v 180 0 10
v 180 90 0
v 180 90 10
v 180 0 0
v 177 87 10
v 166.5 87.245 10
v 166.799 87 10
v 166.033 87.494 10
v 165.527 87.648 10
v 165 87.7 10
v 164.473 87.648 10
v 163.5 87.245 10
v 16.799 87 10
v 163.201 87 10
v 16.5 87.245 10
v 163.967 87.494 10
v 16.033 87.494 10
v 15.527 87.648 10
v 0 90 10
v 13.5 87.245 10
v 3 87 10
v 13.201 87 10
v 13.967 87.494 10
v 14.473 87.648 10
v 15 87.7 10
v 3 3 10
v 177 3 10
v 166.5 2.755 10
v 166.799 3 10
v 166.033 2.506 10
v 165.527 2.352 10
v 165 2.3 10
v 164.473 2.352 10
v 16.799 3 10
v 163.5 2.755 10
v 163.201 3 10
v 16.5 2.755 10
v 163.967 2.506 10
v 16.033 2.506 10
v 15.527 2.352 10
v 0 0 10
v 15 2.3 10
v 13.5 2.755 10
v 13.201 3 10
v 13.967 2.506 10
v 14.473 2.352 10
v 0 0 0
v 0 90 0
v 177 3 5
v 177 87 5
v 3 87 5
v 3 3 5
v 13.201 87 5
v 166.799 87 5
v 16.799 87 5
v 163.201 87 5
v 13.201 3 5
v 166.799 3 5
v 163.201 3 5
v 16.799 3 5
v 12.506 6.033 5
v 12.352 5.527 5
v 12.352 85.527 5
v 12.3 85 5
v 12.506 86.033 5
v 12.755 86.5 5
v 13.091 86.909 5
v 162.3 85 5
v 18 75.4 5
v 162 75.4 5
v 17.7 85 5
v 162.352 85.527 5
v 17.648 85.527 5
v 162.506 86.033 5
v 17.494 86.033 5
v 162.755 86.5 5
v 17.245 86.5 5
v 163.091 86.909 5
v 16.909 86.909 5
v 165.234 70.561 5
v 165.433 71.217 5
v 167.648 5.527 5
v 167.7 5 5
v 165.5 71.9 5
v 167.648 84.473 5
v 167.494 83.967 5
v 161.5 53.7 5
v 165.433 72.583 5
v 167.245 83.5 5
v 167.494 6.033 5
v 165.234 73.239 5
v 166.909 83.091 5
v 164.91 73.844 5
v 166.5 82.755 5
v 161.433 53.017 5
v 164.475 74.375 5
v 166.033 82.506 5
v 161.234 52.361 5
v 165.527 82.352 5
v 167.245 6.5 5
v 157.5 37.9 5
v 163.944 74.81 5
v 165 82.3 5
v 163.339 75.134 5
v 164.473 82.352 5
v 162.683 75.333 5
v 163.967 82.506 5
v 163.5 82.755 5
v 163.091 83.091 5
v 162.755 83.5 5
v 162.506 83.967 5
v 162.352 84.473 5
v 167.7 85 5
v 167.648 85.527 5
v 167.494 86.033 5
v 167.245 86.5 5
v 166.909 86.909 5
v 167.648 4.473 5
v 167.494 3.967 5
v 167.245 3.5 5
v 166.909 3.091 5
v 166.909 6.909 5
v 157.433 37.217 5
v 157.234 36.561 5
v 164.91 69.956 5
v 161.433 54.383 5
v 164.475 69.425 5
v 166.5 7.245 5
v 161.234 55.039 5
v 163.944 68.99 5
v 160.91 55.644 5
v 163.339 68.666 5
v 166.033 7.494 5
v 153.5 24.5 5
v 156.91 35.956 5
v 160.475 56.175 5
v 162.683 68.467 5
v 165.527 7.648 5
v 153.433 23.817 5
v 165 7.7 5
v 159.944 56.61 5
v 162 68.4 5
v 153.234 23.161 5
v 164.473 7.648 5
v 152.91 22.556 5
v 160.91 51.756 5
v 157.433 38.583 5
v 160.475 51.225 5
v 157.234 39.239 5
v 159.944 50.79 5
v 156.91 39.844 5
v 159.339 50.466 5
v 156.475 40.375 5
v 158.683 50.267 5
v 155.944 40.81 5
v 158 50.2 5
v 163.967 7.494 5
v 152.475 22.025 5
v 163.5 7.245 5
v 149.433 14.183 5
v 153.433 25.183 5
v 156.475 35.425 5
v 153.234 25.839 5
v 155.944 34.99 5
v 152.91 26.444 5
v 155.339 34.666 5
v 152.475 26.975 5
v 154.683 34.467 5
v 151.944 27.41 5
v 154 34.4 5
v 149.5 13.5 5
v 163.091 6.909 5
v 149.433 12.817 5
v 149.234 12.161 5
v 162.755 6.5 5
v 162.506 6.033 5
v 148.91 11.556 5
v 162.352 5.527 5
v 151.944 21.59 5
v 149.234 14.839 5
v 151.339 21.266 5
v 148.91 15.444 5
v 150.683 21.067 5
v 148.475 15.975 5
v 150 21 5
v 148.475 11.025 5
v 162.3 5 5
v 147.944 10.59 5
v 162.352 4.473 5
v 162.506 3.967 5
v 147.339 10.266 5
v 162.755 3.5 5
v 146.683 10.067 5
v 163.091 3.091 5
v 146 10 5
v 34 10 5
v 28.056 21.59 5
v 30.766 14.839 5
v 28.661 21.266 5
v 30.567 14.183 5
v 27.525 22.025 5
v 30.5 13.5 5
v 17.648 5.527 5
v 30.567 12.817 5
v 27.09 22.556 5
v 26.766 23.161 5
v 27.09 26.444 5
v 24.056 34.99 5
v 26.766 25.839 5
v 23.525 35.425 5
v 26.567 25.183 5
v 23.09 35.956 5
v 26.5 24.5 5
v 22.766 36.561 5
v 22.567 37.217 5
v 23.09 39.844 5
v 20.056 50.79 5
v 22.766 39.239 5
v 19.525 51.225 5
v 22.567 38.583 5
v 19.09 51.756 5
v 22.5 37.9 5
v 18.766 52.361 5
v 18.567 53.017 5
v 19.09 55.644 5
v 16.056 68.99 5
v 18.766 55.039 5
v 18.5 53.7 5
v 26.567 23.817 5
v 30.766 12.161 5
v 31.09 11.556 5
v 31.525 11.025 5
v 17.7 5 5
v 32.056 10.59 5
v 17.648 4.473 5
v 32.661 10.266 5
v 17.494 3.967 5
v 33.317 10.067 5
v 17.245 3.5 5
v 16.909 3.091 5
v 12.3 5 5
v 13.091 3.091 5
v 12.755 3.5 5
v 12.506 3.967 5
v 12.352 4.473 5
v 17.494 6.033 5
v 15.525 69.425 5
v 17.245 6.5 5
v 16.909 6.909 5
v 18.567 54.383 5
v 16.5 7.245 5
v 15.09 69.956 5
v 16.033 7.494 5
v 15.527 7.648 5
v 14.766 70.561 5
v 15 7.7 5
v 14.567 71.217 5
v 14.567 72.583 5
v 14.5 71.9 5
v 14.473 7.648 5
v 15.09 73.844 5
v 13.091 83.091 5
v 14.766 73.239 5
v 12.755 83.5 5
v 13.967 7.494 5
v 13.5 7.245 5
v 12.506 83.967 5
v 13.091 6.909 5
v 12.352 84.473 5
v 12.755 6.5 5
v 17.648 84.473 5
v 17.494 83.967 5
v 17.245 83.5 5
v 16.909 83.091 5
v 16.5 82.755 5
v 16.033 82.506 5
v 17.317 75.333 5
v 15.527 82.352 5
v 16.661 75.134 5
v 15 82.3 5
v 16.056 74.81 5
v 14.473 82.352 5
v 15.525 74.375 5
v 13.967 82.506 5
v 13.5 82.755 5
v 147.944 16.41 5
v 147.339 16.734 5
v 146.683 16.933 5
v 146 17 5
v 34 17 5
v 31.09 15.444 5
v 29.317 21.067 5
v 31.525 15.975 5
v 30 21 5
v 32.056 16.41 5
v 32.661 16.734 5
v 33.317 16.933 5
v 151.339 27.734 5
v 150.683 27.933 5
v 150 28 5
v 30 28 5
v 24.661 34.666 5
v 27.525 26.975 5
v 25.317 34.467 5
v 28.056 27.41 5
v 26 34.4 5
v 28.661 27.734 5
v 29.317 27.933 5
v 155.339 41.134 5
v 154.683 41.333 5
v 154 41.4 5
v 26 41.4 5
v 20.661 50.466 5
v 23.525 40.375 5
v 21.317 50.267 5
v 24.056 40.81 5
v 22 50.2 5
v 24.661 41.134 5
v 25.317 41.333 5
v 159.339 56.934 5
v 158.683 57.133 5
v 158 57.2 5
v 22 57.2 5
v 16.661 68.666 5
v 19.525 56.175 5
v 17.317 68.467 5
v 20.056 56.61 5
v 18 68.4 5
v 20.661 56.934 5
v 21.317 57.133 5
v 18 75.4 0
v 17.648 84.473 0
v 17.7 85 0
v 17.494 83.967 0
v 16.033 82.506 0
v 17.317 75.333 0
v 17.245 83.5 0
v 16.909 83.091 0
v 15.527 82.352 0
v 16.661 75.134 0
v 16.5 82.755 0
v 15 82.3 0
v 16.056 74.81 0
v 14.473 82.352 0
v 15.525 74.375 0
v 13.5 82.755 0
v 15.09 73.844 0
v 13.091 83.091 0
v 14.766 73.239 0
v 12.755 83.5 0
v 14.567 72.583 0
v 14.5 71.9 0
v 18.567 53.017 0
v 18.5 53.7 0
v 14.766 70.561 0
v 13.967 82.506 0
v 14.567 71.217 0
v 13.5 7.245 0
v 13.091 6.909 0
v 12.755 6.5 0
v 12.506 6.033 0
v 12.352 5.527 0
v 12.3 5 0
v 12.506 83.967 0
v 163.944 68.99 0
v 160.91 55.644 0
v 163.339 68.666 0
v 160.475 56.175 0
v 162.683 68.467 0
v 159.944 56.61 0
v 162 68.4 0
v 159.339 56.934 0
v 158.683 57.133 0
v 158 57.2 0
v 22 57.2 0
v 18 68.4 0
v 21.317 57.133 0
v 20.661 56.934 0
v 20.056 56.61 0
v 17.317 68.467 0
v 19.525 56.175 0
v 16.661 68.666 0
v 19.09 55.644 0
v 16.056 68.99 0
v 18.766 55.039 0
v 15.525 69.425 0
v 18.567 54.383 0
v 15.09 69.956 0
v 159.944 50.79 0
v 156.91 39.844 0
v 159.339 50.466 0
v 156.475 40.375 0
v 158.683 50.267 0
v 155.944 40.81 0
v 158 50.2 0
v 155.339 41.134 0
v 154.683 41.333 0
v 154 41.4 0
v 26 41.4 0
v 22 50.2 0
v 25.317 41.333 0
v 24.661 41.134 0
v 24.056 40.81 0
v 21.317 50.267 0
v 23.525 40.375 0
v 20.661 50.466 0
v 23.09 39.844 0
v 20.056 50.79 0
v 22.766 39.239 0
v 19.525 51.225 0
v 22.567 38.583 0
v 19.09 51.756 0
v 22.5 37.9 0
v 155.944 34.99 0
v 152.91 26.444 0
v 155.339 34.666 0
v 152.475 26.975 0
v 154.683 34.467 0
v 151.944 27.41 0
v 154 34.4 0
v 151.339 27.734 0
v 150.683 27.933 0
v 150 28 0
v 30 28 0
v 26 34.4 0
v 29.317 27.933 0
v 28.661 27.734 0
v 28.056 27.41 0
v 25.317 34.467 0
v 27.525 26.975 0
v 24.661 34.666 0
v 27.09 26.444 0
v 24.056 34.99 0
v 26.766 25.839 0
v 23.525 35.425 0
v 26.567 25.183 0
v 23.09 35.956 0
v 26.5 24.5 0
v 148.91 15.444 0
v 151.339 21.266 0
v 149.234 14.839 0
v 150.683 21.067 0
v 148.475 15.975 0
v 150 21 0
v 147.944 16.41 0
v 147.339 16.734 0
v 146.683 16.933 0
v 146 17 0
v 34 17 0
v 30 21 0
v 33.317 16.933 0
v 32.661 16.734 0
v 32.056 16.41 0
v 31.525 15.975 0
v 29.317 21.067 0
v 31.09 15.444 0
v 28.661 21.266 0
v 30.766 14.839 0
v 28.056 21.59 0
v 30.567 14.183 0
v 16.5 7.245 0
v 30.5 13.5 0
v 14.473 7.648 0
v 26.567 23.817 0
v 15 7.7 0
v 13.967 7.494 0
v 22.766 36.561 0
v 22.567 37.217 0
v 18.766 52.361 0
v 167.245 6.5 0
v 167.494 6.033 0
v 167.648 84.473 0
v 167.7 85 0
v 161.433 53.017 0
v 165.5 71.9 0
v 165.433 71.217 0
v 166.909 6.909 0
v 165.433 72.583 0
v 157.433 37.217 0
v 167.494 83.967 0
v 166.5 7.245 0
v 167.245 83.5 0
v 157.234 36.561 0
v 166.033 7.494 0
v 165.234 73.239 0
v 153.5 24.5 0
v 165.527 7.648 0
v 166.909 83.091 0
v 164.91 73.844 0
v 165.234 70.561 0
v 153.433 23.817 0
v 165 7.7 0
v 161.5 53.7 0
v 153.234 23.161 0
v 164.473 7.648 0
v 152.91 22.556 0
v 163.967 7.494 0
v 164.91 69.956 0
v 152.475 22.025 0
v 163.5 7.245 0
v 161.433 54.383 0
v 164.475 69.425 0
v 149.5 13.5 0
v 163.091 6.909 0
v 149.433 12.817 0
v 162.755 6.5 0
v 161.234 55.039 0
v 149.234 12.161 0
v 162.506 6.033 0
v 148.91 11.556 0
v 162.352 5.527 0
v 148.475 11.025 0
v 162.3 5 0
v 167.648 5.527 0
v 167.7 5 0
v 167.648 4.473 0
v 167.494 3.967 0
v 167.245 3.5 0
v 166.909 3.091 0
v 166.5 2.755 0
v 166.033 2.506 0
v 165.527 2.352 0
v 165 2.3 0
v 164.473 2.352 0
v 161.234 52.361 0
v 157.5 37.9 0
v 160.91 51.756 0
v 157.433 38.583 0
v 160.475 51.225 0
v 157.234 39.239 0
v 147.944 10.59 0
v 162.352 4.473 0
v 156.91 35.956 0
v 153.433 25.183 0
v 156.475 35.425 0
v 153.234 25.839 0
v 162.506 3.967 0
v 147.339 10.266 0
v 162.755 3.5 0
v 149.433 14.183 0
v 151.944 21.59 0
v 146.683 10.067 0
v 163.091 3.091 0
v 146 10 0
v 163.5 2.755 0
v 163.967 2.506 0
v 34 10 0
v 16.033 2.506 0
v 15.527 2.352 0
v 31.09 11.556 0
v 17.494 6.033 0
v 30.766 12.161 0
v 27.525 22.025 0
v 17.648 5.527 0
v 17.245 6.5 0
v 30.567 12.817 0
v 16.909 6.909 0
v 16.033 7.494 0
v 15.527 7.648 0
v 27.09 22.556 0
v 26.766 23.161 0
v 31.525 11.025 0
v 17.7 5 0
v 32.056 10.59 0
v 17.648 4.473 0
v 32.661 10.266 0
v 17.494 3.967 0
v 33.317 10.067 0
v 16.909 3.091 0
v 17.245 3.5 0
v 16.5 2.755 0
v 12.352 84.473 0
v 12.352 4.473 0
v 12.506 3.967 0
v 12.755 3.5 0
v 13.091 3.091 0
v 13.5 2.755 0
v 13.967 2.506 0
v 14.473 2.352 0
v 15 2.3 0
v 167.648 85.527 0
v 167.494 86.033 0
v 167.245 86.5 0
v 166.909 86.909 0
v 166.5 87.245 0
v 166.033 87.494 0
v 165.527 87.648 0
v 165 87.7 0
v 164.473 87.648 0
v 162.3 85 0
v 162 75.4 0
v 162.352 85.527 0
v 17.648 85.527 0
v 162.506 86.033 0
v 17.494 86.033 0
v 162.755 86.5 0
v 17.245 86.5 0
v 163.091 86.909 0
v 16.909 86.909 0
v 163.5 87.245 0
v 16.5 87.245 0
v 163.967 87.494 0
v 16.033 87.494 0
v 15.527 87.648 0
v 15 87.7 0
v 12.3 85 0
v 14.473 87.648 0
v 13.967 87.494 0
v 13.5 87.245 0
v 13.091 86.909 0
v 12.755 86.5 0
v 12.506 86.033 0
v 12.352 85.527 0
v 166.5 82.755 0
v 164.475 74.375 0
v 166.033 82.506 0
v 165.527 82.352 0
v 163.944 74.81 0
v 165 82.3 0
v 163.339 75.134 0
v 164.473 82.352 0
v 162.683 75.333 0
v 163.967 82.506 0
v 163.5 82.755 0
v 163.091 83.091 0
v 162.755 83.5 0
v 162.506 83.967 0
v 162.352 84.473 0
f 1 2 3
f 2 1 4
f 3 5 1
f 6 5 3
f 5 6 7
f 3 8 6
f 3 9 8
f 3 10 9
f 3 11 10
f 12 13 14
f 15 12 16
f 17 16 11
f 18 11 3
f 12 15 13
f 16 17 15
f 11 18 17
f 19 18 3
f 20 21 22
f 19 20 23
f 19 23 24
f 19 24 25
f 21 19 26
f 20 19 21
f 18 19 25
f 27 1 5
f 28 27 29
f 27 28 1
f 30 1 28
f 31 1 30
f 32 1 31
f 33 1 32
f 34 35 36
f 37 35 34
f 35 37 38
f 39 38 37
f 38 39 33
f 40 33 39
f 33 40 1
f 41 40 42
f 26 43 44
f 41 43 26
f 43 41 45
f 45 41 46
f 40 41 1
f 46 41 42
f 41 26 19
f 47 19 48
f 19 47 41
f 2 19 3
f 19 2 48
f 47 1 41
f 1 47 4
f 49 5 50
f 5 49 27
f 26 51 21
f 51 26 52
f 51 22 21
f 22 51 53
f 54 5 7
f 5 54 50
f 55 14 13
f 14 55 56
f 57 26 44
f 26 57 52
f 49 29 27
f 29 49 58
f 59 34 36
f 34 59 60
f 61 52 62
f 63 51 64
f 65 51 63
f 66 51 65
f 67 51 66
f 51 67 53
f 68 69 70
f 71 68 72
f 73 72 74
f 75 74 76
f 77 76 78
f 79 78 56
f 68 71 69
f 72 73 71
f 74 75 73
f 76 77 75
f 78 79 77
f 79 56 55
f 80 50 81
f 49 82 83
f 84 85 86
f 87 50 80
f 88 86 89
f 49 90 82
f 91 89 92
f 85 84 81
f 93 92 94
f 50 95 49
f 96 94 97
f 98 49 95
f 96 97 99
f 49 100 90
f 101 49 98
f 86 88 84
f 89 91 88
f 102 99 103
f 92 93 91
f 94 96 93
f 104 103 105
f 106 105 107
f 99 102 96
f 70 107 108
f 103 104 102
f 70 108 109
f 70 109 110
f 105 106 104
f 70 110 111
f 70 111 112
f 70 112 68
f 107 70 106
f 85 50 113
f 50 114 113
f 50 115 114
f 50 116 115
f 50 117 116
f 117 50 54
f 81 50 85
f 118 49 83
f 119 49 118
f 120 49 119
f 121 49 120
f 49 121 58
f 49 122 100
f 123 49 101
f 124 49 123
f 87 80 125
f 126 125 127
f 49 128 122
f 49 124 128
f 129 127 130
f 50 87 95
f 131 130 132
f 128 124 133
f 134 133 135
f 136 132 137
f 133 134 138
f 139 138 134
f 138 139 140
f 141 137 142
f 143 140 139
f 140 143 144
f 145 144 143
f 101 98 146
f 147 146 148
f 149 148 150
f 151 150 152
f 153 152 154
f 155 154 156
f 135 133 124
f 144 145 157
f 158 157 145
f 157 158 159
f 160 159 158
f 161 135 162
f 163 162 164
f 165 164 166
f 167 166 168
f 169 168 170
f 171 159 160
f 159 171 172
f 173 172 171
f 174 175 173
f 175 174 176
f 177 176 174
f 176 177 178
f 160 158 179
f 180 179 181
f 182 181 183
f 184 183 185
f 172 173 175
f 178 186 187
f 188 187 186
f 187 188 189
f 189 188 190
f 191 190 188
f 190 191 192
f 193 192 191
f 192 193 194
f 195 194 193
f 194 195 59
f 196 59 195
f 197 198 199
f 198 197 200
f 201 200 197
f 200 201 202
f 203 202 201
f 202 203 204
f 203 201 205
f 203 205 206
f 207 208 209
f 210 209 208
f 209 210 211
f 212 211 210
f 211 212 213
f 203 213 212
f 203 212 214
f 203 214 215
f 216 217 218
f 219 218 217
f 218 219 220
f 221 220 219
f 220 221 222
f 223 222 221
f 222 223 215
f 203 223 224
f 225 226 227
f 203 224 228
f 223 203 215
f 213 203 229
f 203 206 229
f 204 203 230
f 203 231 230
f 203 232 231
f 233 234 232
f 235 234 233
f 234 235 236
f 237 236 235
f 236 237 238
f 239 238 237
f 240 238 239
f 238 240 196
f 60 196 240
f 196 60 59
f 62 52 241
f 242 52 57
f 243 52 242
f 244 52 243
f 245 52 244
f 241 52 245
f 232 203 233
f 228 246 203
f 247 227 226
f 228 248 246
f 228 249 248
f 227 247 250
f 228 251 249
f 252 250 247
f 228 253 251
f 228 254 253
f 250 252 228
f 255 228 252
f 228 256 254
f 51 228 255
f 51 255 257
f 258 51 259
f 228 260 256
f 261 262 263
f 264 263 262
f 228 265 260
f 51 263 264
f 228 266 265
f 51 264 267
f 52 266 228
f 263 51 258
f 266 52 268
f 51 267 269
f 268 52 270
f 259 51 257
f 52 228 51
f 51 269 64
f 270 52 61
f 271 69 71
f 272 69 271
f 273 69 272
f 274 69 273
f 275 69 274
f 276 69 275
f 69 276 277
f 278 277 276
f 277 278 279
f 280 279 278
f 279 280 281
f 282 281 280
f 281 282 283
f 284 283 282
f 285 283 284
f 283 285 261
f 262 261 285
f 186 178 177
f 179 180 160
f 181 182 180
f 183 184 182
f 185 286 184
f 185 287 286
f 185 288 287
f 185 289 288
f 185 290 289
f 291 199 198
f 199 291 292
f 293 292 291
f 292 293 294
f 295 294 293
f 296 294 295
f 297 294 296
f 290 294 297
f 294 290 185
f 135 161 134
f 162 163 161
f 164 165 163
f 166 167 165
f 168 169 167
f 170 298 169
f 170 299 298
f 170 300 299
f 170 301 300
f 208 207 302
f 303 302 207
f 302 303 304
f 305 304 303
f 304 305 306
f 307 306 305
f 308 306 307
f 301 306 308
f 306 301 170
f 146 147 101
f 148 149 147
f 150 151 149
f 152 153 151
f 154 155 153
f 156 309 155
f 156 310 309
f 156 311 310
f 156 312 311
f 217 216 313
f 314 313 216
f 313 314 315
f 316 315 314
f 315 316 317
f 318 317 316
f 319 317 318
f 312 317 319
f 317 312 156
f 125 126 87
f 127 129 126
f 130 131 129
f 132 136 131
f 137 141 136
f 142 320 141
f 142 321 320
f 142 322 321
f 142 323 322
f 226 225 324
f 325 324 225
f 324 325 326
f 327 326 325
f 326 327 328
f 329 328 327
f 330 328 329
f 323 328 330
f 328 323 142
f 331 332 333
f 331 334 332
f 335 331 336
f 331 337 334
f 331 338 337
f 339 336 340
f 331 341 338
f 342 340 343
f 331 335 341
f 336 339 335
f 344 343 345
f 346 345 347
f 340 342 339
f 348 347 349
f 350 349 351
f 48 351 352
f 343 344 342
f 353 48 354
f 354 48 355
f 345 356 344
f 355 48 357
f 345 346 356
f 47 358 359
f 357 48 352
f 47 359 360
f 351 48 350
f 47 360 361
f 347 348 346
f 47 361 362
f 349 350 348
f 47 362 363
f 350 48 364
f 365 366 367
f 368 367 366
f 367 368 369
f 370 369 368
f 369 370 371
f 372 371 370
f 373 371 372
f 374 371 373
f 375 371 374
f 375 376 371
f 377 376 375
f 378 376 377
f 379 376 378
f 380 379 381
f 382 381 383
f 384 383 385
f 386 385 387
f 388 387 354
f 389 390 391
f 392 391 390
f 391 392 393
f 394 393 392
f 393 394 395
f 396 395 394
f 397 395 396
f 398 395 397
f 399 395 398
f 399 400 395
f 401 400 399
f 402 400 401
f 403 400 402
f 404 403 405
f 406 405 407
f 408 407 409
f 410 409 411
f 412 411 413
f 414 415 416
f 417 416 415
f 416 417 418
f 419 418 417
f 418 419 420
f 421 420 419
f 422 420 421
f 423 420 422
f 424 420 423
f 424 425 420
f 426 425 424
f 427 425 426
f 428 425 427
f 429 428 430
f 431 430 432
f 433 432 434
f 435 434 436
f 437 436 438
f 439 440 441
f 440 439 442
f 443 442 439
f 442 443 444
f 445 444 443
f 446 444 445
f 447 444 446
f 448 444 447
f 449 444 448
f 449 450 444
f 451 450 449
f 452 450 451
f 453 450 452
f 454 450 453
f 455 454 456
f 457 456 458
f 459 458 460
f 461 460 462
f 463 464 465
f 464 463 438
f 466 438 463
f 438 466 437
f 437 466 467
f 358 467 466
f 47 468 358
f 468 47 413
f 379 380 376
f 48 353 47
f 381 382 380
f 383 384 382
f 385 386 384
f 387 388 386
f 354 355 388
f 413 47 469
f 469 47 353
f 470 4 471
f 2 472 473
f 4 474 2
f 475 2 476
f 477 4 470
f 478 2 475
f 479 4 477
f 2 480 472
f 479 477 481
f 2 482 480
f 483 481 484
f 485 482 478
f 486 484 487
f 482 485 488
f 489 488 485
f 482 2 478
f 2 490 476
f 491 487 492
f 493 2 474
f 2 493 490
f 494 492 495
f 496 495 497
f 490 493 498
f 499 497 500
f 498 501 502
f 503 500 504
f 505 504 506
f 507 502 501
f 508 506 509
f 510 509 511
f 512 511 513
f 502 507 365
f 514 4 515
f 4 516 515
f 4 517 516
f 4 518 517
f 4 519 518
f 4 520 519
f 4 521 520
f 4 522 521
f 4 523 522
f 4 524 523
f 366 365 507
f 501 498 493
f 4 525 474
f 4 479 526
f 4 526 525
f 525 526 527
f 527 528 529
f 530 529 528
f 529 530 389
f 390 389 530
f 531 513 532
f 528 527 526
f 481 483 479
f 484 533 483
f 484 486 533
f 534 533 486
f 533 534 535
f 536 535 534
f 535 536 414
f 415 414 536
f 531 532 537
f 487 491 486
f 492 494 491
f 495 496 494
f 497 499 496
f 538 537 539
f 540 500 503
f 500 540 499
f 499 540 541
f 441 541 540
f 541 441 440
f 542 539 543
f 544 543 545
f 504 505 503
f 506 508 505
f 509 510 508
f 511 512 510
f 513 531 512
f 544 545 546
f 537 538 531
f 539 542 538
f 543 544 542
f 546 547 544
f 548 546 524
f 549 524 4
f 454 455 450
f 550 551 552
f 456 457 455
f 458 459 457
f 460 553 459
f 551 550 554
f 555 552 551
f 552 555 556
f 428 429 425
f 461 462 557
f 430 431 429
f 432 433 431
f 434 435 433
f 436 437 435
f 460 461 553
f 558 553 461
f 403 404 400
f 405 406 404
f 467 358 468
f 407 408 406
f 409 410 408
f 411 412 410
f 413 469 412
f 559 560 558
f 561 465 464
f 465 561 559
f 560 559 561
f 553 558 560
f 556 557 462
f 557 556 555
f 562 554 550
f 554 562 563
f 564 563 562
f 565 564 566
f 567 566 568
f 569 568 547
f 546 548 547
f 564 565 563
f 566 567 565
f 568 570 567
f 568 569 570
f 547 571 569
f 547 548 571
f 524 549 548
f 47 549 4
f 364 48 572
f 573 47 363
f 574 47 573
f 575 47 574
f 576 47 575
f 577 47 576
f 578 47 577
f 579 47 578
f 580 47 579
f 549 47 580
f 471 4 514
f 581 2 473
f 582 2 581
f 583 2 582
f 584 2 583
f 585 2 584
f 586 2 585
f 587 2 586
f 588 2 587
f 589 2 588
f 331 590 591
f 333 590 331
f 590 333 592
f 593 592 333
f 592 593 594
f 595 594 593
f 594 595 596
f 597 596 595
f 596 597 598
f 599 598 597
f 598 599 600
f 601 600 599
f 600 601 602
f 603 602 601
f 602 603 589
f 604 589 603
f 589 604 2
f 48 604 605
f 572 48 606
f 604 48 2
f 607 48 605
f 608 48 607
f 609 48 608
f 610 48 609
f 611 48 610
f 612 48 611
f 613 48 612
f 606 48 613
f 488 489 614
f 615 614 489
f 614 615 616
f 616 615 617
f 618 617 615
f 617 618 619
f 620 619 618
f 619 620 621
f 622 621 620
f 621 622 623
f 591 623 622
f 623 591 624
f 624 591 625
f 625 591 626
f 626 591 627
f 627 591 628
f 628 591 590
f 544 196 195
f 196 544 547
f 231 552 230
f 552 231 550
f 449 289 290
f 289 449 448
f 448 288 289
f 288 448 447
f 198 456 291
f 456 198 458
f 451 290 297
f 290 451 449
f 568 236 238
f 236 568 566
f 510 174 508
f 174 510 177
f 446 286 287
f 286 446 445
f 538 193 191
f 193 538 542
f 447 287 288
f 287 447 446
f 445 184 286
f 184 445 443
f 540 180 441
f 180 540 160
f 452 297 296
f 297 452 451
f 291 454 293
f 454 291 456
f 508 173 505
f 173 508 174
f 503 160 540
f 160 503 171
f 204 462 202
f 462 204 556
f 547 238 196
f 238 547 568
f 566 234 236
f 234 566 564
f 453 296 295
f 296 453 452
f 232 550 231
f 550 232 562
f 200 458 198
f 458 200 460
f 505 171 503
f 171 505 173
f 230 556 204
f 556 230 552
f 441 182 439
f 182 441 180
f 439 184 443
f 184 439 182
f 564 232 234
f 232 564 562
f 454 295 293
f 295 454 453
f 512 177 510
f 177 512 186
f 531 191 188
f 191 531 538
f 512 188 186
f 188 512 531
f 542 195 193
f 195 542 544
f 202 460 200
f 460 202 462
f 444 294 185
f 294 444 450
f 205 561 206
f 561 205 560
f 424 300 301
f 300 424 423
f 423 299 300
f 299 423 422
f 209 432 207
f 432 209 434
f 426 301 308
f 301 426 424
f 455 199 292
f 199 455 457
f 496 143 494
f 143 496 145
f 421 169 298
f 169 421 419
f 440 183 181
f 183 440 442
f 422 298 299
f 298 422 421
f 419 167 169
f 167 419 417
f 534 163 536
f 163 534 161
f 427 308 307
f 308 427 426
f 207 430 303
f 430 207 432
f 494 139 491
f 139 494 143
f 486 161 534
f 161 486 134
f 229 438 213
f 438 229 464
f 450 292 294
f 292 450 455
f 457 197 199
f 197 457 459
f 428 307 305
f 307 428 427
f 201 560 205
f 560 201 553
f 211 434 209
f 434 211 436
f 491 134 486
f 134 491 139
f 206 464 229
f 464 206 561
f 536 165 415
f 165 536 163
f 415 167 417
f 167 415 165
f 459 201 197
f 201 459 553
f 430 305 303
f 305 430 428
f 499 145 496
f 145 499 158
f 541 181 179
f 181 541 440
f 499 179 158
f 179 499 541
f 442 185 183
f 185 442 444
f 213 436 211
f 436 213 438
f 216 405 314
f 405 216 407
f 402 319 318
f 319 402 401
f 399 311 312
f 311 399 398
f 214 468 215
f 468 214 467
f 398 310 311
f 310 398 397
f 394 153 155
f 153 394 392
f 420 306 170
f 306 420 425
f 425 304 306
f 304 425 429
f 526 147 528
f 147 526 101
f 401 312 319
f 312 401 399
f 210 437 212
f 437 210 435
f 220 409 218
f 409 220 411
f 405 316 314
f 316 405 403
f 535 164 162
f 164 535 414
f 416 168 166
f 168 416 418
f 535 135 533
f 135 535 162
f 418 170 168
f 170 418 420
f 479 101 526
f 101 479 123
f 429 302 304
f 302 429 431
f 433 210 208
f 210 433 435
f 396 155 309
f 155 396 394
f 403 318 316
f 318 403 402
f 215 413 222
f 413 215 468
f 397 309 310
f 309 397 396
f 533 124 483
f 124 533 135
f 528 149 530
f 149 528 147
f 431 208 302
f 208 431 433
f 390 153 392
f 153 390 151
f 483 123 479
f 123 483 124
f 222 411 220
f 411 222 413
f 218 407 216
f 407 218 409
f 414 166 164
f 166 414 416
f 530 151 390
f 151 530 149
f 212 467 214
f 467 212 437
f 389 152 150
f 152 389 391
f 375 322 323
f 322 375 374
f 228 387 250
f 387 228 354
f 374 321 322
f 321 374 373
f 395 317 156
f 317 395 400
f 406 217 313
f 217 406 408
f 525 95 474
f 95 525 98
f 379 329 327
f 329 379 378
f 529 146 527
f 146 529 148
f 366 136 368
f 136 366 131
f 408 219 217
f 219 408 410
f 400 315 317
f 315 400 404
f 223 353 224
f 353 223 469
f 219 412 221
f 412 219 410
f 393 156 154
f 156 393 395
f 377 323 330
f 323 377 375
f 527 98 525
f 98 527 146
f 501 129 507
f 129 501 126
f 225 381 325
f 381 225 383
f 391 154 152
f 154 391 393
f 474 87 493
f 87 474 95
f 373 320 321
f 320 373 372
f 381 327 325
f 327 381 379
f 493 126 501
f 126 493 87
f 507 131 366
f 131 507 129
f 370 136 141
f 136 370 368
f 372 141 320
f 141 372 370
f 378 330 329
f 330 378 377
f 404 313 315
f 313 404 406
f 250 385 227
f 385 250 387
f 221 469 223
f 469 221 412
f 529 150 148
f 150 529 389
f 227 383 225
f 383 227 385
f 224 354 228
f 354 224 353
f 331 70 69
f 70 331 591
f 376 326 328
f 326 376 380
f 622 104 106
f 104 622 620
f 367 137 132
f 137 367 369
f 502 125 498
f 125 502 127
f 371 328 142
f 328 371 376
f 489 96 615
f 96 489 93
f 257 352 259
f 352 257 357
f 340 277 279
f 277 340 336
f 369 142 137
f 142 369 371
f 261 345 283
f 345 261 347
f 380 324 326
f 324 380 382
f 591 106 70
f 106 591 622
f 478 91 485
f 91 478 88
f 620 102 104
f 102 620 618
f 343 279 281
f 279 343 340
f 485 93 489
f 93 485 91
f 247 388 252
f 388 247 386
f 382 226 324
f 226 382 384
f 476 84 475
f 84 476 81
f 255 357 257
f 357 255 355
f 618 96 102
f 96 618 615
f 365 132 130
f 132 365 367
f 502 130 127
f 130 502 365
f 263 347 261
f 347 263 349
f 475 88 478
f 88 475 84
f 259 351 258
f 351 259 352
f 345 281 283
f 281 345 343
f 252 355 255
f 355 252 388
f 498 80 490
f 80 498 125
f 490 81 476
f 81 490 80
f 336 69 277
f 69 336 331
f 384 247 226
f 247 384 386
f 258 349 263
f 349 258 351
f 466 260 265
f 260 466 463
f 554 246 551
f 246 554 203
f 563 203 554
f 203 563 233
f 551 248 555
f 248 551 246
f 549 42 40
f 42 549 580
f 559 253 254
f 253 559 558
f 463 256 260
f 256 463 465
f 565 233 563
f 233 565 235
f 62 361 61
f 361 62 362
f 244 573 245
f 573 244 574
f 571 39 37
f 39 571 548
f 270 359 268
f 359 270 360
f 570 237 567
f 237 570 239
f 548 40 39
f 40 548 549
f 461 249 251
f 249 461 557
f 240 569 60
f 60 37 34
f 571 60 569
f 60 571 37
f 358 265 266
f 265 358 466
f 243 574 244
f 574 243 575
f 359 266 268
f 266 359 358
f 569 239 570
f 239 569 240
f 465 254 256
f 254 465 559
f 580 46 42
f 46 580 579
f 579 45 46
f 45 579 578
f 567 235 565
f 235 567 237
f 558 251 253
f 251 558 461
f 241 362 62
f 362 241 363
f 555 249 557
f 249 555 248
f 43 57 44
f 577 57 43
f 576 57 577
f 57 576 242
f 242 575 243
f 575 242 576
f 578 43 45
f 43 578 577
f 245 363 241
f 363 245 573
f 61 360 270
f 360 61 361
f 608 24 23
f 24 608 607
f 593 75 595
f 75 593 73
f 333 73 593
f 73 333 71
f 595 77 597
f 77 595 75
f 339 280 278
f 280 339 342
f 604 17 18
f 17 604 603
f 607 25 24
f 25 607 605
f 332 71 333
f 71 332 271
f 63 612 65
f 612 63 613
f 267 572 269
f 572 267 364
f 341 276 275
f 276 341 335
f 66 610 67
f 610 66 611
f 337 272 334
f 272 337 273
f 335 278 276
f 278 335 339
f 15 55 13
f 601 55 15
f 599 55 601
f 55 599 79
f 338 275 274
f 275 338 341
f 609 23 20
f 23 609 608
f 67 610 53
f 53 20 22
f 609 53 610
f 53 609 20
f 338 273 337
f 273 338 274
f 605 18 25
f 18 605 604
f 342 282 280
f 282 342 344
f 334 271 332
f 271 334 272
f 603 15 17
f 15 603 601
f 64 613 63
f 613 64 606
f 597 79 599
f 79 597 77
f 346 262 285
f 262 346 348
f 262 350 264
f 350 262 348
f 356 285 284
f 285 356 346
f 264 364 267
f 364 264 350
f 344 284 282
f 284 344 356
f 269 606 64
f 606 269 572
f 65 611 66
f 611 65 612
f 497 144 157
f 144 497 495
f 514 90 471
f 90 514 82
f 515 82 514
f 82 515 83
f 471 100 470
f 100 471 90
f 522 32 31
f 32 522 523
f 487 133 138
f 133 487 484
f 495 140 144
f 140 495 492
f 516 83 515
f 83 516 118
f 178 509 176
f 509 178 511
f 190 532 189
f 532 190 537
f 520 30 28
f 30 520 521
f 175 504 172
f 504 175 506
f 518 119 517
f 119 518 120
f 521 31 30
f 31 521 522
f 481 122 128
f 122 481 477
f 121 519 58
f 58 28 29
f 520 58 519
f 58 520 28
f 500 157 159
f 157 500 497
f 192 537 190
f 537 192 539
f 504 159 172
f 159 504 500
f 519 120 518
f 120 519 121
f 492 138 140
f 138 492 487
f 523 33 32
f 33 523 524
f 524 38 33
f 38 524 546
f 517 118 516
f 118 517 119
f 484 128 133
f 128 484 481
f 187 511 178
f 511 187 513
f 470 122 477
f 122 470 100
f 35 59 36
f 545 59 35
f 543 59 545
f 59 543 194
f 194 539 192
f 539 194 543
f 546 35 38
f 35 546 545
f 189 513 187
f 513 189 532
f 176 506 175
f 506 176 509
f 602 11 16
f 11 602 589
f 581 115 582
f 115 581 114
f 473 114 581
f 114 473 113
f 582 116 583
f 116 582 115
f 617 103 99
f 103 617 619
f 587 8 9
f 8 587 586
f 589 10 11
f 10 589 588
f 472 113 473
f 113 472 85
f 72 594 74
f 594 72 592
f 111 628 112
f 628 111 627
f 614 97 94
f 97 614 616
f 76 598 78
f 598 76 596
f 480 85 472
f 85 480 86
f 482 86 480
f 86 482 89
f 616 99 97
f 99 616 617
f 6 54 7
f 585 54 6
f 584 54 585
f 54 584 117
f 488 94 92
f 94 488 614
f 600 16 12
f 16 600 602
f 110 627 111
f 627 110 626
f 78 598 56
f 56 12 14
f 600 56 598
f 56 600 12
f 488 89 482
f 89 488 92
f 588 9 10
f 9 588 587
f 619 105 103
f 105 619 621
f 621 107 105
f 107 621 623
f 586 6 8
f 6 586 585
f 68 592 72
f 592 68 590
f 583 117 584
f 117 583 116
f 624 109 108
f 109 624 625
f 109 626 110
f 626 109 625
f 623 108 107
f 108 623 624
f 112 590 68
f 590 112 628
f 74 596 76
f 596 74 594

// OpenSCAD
$fn = 32;

// ----------------------------------------------------------------------
// Slotted panel: 180 x 90 mm, 5 рядов of slots
// ----------------------------------------------------------------------

// --- parameters (mm) ---
panel_w = 180;            // panel width
panel_d = 90;             // panel depth
thick = 5;                // panel thickness
slot_w = 7;               // slot width
pitch0 = 11;              // first row pitch
pitch_step = 2.4;         // pitch increase per row
margin = 10;              // margin around the slot field
rows = 5;                 // number of slot rows
mount_d = 5.4;            // mounting holes
mount_x = 75;             // mounting hole offset
rim_h = 10;               // rim height
rim_t = 3;                // rim wall thickness

difference() {
  union() {
    cube([panel_w, panel_d, thick]);
    translate([0, 0, thick - 1]) difference() {
      cube([panel_w, panel_d, rim_h - thick + 1]);
      translate([rim_t, rim_t, -2.5]) cube([panel_w - 2 * rim_t, panel_d - 2 * rim_t, rim_h - thick + 6]);
    }
  }
  /* slot rows: stadium shaped cutters, 2.5 mm clear of both faces */
  /* row 0: pitch 11, length 112 */
  hull() {
    translate([34, 13.5, -2.5]) cylinder(h = thick + 5, d = slot_w);
    translate([146, 13.5, -2.5]) cylinder(h = thick + 5, d = slot_w);
  }
  /* row 1: pitch 13.4, length 120 */
  hull() {
    translate([30, 24.5, -2.5]) cylinder(h = thick + 5, d = slot_w);
    translate([150, 24.5, -2.5]) cylinder(h = thick + 5, d = slot_w);
  }
  /* row 2: pitch 15.8, length 128 */
  hull() {
    translate([26, 37.9, -2.5]) cylinder(h = thick + 5, d = slot_w);
    translate([154, 37.9, -2.5]) cylinder(h = thick + 5, d = slot_w);
  }
  /* row 3: pitch 18.2, length 136 */
  hull() {
    translate([22, 53.7, -2.5]) cylinder(h = thick + 5, d = slot_w);
    translate([158, 53.7, -2.5]) cylinder(h = thick + 5, d = slot_w);
  }
  /* row 4: pitch 20.6, length 144 */
  hull() {
    translate([18, 71.9, -2.5]) cylinder(h = thick + 5, d = slot_w);
    translate([162, 71.9, -2.5]) cylinder(h = thick + 5, d = slot_w);
  }
  translate([15, 5, -2.5]) cylinder(h = 15, d = mount_d);
  translate([15, 85, -2.5]) cylinder(h = 15, d = mount_d);
  translate([165, 5, -2.5]) cylinder(h = 15, d = mount_d);
  translate([165, 85, -2.5]) cylinder(h = 15, d = mount_d);
}
